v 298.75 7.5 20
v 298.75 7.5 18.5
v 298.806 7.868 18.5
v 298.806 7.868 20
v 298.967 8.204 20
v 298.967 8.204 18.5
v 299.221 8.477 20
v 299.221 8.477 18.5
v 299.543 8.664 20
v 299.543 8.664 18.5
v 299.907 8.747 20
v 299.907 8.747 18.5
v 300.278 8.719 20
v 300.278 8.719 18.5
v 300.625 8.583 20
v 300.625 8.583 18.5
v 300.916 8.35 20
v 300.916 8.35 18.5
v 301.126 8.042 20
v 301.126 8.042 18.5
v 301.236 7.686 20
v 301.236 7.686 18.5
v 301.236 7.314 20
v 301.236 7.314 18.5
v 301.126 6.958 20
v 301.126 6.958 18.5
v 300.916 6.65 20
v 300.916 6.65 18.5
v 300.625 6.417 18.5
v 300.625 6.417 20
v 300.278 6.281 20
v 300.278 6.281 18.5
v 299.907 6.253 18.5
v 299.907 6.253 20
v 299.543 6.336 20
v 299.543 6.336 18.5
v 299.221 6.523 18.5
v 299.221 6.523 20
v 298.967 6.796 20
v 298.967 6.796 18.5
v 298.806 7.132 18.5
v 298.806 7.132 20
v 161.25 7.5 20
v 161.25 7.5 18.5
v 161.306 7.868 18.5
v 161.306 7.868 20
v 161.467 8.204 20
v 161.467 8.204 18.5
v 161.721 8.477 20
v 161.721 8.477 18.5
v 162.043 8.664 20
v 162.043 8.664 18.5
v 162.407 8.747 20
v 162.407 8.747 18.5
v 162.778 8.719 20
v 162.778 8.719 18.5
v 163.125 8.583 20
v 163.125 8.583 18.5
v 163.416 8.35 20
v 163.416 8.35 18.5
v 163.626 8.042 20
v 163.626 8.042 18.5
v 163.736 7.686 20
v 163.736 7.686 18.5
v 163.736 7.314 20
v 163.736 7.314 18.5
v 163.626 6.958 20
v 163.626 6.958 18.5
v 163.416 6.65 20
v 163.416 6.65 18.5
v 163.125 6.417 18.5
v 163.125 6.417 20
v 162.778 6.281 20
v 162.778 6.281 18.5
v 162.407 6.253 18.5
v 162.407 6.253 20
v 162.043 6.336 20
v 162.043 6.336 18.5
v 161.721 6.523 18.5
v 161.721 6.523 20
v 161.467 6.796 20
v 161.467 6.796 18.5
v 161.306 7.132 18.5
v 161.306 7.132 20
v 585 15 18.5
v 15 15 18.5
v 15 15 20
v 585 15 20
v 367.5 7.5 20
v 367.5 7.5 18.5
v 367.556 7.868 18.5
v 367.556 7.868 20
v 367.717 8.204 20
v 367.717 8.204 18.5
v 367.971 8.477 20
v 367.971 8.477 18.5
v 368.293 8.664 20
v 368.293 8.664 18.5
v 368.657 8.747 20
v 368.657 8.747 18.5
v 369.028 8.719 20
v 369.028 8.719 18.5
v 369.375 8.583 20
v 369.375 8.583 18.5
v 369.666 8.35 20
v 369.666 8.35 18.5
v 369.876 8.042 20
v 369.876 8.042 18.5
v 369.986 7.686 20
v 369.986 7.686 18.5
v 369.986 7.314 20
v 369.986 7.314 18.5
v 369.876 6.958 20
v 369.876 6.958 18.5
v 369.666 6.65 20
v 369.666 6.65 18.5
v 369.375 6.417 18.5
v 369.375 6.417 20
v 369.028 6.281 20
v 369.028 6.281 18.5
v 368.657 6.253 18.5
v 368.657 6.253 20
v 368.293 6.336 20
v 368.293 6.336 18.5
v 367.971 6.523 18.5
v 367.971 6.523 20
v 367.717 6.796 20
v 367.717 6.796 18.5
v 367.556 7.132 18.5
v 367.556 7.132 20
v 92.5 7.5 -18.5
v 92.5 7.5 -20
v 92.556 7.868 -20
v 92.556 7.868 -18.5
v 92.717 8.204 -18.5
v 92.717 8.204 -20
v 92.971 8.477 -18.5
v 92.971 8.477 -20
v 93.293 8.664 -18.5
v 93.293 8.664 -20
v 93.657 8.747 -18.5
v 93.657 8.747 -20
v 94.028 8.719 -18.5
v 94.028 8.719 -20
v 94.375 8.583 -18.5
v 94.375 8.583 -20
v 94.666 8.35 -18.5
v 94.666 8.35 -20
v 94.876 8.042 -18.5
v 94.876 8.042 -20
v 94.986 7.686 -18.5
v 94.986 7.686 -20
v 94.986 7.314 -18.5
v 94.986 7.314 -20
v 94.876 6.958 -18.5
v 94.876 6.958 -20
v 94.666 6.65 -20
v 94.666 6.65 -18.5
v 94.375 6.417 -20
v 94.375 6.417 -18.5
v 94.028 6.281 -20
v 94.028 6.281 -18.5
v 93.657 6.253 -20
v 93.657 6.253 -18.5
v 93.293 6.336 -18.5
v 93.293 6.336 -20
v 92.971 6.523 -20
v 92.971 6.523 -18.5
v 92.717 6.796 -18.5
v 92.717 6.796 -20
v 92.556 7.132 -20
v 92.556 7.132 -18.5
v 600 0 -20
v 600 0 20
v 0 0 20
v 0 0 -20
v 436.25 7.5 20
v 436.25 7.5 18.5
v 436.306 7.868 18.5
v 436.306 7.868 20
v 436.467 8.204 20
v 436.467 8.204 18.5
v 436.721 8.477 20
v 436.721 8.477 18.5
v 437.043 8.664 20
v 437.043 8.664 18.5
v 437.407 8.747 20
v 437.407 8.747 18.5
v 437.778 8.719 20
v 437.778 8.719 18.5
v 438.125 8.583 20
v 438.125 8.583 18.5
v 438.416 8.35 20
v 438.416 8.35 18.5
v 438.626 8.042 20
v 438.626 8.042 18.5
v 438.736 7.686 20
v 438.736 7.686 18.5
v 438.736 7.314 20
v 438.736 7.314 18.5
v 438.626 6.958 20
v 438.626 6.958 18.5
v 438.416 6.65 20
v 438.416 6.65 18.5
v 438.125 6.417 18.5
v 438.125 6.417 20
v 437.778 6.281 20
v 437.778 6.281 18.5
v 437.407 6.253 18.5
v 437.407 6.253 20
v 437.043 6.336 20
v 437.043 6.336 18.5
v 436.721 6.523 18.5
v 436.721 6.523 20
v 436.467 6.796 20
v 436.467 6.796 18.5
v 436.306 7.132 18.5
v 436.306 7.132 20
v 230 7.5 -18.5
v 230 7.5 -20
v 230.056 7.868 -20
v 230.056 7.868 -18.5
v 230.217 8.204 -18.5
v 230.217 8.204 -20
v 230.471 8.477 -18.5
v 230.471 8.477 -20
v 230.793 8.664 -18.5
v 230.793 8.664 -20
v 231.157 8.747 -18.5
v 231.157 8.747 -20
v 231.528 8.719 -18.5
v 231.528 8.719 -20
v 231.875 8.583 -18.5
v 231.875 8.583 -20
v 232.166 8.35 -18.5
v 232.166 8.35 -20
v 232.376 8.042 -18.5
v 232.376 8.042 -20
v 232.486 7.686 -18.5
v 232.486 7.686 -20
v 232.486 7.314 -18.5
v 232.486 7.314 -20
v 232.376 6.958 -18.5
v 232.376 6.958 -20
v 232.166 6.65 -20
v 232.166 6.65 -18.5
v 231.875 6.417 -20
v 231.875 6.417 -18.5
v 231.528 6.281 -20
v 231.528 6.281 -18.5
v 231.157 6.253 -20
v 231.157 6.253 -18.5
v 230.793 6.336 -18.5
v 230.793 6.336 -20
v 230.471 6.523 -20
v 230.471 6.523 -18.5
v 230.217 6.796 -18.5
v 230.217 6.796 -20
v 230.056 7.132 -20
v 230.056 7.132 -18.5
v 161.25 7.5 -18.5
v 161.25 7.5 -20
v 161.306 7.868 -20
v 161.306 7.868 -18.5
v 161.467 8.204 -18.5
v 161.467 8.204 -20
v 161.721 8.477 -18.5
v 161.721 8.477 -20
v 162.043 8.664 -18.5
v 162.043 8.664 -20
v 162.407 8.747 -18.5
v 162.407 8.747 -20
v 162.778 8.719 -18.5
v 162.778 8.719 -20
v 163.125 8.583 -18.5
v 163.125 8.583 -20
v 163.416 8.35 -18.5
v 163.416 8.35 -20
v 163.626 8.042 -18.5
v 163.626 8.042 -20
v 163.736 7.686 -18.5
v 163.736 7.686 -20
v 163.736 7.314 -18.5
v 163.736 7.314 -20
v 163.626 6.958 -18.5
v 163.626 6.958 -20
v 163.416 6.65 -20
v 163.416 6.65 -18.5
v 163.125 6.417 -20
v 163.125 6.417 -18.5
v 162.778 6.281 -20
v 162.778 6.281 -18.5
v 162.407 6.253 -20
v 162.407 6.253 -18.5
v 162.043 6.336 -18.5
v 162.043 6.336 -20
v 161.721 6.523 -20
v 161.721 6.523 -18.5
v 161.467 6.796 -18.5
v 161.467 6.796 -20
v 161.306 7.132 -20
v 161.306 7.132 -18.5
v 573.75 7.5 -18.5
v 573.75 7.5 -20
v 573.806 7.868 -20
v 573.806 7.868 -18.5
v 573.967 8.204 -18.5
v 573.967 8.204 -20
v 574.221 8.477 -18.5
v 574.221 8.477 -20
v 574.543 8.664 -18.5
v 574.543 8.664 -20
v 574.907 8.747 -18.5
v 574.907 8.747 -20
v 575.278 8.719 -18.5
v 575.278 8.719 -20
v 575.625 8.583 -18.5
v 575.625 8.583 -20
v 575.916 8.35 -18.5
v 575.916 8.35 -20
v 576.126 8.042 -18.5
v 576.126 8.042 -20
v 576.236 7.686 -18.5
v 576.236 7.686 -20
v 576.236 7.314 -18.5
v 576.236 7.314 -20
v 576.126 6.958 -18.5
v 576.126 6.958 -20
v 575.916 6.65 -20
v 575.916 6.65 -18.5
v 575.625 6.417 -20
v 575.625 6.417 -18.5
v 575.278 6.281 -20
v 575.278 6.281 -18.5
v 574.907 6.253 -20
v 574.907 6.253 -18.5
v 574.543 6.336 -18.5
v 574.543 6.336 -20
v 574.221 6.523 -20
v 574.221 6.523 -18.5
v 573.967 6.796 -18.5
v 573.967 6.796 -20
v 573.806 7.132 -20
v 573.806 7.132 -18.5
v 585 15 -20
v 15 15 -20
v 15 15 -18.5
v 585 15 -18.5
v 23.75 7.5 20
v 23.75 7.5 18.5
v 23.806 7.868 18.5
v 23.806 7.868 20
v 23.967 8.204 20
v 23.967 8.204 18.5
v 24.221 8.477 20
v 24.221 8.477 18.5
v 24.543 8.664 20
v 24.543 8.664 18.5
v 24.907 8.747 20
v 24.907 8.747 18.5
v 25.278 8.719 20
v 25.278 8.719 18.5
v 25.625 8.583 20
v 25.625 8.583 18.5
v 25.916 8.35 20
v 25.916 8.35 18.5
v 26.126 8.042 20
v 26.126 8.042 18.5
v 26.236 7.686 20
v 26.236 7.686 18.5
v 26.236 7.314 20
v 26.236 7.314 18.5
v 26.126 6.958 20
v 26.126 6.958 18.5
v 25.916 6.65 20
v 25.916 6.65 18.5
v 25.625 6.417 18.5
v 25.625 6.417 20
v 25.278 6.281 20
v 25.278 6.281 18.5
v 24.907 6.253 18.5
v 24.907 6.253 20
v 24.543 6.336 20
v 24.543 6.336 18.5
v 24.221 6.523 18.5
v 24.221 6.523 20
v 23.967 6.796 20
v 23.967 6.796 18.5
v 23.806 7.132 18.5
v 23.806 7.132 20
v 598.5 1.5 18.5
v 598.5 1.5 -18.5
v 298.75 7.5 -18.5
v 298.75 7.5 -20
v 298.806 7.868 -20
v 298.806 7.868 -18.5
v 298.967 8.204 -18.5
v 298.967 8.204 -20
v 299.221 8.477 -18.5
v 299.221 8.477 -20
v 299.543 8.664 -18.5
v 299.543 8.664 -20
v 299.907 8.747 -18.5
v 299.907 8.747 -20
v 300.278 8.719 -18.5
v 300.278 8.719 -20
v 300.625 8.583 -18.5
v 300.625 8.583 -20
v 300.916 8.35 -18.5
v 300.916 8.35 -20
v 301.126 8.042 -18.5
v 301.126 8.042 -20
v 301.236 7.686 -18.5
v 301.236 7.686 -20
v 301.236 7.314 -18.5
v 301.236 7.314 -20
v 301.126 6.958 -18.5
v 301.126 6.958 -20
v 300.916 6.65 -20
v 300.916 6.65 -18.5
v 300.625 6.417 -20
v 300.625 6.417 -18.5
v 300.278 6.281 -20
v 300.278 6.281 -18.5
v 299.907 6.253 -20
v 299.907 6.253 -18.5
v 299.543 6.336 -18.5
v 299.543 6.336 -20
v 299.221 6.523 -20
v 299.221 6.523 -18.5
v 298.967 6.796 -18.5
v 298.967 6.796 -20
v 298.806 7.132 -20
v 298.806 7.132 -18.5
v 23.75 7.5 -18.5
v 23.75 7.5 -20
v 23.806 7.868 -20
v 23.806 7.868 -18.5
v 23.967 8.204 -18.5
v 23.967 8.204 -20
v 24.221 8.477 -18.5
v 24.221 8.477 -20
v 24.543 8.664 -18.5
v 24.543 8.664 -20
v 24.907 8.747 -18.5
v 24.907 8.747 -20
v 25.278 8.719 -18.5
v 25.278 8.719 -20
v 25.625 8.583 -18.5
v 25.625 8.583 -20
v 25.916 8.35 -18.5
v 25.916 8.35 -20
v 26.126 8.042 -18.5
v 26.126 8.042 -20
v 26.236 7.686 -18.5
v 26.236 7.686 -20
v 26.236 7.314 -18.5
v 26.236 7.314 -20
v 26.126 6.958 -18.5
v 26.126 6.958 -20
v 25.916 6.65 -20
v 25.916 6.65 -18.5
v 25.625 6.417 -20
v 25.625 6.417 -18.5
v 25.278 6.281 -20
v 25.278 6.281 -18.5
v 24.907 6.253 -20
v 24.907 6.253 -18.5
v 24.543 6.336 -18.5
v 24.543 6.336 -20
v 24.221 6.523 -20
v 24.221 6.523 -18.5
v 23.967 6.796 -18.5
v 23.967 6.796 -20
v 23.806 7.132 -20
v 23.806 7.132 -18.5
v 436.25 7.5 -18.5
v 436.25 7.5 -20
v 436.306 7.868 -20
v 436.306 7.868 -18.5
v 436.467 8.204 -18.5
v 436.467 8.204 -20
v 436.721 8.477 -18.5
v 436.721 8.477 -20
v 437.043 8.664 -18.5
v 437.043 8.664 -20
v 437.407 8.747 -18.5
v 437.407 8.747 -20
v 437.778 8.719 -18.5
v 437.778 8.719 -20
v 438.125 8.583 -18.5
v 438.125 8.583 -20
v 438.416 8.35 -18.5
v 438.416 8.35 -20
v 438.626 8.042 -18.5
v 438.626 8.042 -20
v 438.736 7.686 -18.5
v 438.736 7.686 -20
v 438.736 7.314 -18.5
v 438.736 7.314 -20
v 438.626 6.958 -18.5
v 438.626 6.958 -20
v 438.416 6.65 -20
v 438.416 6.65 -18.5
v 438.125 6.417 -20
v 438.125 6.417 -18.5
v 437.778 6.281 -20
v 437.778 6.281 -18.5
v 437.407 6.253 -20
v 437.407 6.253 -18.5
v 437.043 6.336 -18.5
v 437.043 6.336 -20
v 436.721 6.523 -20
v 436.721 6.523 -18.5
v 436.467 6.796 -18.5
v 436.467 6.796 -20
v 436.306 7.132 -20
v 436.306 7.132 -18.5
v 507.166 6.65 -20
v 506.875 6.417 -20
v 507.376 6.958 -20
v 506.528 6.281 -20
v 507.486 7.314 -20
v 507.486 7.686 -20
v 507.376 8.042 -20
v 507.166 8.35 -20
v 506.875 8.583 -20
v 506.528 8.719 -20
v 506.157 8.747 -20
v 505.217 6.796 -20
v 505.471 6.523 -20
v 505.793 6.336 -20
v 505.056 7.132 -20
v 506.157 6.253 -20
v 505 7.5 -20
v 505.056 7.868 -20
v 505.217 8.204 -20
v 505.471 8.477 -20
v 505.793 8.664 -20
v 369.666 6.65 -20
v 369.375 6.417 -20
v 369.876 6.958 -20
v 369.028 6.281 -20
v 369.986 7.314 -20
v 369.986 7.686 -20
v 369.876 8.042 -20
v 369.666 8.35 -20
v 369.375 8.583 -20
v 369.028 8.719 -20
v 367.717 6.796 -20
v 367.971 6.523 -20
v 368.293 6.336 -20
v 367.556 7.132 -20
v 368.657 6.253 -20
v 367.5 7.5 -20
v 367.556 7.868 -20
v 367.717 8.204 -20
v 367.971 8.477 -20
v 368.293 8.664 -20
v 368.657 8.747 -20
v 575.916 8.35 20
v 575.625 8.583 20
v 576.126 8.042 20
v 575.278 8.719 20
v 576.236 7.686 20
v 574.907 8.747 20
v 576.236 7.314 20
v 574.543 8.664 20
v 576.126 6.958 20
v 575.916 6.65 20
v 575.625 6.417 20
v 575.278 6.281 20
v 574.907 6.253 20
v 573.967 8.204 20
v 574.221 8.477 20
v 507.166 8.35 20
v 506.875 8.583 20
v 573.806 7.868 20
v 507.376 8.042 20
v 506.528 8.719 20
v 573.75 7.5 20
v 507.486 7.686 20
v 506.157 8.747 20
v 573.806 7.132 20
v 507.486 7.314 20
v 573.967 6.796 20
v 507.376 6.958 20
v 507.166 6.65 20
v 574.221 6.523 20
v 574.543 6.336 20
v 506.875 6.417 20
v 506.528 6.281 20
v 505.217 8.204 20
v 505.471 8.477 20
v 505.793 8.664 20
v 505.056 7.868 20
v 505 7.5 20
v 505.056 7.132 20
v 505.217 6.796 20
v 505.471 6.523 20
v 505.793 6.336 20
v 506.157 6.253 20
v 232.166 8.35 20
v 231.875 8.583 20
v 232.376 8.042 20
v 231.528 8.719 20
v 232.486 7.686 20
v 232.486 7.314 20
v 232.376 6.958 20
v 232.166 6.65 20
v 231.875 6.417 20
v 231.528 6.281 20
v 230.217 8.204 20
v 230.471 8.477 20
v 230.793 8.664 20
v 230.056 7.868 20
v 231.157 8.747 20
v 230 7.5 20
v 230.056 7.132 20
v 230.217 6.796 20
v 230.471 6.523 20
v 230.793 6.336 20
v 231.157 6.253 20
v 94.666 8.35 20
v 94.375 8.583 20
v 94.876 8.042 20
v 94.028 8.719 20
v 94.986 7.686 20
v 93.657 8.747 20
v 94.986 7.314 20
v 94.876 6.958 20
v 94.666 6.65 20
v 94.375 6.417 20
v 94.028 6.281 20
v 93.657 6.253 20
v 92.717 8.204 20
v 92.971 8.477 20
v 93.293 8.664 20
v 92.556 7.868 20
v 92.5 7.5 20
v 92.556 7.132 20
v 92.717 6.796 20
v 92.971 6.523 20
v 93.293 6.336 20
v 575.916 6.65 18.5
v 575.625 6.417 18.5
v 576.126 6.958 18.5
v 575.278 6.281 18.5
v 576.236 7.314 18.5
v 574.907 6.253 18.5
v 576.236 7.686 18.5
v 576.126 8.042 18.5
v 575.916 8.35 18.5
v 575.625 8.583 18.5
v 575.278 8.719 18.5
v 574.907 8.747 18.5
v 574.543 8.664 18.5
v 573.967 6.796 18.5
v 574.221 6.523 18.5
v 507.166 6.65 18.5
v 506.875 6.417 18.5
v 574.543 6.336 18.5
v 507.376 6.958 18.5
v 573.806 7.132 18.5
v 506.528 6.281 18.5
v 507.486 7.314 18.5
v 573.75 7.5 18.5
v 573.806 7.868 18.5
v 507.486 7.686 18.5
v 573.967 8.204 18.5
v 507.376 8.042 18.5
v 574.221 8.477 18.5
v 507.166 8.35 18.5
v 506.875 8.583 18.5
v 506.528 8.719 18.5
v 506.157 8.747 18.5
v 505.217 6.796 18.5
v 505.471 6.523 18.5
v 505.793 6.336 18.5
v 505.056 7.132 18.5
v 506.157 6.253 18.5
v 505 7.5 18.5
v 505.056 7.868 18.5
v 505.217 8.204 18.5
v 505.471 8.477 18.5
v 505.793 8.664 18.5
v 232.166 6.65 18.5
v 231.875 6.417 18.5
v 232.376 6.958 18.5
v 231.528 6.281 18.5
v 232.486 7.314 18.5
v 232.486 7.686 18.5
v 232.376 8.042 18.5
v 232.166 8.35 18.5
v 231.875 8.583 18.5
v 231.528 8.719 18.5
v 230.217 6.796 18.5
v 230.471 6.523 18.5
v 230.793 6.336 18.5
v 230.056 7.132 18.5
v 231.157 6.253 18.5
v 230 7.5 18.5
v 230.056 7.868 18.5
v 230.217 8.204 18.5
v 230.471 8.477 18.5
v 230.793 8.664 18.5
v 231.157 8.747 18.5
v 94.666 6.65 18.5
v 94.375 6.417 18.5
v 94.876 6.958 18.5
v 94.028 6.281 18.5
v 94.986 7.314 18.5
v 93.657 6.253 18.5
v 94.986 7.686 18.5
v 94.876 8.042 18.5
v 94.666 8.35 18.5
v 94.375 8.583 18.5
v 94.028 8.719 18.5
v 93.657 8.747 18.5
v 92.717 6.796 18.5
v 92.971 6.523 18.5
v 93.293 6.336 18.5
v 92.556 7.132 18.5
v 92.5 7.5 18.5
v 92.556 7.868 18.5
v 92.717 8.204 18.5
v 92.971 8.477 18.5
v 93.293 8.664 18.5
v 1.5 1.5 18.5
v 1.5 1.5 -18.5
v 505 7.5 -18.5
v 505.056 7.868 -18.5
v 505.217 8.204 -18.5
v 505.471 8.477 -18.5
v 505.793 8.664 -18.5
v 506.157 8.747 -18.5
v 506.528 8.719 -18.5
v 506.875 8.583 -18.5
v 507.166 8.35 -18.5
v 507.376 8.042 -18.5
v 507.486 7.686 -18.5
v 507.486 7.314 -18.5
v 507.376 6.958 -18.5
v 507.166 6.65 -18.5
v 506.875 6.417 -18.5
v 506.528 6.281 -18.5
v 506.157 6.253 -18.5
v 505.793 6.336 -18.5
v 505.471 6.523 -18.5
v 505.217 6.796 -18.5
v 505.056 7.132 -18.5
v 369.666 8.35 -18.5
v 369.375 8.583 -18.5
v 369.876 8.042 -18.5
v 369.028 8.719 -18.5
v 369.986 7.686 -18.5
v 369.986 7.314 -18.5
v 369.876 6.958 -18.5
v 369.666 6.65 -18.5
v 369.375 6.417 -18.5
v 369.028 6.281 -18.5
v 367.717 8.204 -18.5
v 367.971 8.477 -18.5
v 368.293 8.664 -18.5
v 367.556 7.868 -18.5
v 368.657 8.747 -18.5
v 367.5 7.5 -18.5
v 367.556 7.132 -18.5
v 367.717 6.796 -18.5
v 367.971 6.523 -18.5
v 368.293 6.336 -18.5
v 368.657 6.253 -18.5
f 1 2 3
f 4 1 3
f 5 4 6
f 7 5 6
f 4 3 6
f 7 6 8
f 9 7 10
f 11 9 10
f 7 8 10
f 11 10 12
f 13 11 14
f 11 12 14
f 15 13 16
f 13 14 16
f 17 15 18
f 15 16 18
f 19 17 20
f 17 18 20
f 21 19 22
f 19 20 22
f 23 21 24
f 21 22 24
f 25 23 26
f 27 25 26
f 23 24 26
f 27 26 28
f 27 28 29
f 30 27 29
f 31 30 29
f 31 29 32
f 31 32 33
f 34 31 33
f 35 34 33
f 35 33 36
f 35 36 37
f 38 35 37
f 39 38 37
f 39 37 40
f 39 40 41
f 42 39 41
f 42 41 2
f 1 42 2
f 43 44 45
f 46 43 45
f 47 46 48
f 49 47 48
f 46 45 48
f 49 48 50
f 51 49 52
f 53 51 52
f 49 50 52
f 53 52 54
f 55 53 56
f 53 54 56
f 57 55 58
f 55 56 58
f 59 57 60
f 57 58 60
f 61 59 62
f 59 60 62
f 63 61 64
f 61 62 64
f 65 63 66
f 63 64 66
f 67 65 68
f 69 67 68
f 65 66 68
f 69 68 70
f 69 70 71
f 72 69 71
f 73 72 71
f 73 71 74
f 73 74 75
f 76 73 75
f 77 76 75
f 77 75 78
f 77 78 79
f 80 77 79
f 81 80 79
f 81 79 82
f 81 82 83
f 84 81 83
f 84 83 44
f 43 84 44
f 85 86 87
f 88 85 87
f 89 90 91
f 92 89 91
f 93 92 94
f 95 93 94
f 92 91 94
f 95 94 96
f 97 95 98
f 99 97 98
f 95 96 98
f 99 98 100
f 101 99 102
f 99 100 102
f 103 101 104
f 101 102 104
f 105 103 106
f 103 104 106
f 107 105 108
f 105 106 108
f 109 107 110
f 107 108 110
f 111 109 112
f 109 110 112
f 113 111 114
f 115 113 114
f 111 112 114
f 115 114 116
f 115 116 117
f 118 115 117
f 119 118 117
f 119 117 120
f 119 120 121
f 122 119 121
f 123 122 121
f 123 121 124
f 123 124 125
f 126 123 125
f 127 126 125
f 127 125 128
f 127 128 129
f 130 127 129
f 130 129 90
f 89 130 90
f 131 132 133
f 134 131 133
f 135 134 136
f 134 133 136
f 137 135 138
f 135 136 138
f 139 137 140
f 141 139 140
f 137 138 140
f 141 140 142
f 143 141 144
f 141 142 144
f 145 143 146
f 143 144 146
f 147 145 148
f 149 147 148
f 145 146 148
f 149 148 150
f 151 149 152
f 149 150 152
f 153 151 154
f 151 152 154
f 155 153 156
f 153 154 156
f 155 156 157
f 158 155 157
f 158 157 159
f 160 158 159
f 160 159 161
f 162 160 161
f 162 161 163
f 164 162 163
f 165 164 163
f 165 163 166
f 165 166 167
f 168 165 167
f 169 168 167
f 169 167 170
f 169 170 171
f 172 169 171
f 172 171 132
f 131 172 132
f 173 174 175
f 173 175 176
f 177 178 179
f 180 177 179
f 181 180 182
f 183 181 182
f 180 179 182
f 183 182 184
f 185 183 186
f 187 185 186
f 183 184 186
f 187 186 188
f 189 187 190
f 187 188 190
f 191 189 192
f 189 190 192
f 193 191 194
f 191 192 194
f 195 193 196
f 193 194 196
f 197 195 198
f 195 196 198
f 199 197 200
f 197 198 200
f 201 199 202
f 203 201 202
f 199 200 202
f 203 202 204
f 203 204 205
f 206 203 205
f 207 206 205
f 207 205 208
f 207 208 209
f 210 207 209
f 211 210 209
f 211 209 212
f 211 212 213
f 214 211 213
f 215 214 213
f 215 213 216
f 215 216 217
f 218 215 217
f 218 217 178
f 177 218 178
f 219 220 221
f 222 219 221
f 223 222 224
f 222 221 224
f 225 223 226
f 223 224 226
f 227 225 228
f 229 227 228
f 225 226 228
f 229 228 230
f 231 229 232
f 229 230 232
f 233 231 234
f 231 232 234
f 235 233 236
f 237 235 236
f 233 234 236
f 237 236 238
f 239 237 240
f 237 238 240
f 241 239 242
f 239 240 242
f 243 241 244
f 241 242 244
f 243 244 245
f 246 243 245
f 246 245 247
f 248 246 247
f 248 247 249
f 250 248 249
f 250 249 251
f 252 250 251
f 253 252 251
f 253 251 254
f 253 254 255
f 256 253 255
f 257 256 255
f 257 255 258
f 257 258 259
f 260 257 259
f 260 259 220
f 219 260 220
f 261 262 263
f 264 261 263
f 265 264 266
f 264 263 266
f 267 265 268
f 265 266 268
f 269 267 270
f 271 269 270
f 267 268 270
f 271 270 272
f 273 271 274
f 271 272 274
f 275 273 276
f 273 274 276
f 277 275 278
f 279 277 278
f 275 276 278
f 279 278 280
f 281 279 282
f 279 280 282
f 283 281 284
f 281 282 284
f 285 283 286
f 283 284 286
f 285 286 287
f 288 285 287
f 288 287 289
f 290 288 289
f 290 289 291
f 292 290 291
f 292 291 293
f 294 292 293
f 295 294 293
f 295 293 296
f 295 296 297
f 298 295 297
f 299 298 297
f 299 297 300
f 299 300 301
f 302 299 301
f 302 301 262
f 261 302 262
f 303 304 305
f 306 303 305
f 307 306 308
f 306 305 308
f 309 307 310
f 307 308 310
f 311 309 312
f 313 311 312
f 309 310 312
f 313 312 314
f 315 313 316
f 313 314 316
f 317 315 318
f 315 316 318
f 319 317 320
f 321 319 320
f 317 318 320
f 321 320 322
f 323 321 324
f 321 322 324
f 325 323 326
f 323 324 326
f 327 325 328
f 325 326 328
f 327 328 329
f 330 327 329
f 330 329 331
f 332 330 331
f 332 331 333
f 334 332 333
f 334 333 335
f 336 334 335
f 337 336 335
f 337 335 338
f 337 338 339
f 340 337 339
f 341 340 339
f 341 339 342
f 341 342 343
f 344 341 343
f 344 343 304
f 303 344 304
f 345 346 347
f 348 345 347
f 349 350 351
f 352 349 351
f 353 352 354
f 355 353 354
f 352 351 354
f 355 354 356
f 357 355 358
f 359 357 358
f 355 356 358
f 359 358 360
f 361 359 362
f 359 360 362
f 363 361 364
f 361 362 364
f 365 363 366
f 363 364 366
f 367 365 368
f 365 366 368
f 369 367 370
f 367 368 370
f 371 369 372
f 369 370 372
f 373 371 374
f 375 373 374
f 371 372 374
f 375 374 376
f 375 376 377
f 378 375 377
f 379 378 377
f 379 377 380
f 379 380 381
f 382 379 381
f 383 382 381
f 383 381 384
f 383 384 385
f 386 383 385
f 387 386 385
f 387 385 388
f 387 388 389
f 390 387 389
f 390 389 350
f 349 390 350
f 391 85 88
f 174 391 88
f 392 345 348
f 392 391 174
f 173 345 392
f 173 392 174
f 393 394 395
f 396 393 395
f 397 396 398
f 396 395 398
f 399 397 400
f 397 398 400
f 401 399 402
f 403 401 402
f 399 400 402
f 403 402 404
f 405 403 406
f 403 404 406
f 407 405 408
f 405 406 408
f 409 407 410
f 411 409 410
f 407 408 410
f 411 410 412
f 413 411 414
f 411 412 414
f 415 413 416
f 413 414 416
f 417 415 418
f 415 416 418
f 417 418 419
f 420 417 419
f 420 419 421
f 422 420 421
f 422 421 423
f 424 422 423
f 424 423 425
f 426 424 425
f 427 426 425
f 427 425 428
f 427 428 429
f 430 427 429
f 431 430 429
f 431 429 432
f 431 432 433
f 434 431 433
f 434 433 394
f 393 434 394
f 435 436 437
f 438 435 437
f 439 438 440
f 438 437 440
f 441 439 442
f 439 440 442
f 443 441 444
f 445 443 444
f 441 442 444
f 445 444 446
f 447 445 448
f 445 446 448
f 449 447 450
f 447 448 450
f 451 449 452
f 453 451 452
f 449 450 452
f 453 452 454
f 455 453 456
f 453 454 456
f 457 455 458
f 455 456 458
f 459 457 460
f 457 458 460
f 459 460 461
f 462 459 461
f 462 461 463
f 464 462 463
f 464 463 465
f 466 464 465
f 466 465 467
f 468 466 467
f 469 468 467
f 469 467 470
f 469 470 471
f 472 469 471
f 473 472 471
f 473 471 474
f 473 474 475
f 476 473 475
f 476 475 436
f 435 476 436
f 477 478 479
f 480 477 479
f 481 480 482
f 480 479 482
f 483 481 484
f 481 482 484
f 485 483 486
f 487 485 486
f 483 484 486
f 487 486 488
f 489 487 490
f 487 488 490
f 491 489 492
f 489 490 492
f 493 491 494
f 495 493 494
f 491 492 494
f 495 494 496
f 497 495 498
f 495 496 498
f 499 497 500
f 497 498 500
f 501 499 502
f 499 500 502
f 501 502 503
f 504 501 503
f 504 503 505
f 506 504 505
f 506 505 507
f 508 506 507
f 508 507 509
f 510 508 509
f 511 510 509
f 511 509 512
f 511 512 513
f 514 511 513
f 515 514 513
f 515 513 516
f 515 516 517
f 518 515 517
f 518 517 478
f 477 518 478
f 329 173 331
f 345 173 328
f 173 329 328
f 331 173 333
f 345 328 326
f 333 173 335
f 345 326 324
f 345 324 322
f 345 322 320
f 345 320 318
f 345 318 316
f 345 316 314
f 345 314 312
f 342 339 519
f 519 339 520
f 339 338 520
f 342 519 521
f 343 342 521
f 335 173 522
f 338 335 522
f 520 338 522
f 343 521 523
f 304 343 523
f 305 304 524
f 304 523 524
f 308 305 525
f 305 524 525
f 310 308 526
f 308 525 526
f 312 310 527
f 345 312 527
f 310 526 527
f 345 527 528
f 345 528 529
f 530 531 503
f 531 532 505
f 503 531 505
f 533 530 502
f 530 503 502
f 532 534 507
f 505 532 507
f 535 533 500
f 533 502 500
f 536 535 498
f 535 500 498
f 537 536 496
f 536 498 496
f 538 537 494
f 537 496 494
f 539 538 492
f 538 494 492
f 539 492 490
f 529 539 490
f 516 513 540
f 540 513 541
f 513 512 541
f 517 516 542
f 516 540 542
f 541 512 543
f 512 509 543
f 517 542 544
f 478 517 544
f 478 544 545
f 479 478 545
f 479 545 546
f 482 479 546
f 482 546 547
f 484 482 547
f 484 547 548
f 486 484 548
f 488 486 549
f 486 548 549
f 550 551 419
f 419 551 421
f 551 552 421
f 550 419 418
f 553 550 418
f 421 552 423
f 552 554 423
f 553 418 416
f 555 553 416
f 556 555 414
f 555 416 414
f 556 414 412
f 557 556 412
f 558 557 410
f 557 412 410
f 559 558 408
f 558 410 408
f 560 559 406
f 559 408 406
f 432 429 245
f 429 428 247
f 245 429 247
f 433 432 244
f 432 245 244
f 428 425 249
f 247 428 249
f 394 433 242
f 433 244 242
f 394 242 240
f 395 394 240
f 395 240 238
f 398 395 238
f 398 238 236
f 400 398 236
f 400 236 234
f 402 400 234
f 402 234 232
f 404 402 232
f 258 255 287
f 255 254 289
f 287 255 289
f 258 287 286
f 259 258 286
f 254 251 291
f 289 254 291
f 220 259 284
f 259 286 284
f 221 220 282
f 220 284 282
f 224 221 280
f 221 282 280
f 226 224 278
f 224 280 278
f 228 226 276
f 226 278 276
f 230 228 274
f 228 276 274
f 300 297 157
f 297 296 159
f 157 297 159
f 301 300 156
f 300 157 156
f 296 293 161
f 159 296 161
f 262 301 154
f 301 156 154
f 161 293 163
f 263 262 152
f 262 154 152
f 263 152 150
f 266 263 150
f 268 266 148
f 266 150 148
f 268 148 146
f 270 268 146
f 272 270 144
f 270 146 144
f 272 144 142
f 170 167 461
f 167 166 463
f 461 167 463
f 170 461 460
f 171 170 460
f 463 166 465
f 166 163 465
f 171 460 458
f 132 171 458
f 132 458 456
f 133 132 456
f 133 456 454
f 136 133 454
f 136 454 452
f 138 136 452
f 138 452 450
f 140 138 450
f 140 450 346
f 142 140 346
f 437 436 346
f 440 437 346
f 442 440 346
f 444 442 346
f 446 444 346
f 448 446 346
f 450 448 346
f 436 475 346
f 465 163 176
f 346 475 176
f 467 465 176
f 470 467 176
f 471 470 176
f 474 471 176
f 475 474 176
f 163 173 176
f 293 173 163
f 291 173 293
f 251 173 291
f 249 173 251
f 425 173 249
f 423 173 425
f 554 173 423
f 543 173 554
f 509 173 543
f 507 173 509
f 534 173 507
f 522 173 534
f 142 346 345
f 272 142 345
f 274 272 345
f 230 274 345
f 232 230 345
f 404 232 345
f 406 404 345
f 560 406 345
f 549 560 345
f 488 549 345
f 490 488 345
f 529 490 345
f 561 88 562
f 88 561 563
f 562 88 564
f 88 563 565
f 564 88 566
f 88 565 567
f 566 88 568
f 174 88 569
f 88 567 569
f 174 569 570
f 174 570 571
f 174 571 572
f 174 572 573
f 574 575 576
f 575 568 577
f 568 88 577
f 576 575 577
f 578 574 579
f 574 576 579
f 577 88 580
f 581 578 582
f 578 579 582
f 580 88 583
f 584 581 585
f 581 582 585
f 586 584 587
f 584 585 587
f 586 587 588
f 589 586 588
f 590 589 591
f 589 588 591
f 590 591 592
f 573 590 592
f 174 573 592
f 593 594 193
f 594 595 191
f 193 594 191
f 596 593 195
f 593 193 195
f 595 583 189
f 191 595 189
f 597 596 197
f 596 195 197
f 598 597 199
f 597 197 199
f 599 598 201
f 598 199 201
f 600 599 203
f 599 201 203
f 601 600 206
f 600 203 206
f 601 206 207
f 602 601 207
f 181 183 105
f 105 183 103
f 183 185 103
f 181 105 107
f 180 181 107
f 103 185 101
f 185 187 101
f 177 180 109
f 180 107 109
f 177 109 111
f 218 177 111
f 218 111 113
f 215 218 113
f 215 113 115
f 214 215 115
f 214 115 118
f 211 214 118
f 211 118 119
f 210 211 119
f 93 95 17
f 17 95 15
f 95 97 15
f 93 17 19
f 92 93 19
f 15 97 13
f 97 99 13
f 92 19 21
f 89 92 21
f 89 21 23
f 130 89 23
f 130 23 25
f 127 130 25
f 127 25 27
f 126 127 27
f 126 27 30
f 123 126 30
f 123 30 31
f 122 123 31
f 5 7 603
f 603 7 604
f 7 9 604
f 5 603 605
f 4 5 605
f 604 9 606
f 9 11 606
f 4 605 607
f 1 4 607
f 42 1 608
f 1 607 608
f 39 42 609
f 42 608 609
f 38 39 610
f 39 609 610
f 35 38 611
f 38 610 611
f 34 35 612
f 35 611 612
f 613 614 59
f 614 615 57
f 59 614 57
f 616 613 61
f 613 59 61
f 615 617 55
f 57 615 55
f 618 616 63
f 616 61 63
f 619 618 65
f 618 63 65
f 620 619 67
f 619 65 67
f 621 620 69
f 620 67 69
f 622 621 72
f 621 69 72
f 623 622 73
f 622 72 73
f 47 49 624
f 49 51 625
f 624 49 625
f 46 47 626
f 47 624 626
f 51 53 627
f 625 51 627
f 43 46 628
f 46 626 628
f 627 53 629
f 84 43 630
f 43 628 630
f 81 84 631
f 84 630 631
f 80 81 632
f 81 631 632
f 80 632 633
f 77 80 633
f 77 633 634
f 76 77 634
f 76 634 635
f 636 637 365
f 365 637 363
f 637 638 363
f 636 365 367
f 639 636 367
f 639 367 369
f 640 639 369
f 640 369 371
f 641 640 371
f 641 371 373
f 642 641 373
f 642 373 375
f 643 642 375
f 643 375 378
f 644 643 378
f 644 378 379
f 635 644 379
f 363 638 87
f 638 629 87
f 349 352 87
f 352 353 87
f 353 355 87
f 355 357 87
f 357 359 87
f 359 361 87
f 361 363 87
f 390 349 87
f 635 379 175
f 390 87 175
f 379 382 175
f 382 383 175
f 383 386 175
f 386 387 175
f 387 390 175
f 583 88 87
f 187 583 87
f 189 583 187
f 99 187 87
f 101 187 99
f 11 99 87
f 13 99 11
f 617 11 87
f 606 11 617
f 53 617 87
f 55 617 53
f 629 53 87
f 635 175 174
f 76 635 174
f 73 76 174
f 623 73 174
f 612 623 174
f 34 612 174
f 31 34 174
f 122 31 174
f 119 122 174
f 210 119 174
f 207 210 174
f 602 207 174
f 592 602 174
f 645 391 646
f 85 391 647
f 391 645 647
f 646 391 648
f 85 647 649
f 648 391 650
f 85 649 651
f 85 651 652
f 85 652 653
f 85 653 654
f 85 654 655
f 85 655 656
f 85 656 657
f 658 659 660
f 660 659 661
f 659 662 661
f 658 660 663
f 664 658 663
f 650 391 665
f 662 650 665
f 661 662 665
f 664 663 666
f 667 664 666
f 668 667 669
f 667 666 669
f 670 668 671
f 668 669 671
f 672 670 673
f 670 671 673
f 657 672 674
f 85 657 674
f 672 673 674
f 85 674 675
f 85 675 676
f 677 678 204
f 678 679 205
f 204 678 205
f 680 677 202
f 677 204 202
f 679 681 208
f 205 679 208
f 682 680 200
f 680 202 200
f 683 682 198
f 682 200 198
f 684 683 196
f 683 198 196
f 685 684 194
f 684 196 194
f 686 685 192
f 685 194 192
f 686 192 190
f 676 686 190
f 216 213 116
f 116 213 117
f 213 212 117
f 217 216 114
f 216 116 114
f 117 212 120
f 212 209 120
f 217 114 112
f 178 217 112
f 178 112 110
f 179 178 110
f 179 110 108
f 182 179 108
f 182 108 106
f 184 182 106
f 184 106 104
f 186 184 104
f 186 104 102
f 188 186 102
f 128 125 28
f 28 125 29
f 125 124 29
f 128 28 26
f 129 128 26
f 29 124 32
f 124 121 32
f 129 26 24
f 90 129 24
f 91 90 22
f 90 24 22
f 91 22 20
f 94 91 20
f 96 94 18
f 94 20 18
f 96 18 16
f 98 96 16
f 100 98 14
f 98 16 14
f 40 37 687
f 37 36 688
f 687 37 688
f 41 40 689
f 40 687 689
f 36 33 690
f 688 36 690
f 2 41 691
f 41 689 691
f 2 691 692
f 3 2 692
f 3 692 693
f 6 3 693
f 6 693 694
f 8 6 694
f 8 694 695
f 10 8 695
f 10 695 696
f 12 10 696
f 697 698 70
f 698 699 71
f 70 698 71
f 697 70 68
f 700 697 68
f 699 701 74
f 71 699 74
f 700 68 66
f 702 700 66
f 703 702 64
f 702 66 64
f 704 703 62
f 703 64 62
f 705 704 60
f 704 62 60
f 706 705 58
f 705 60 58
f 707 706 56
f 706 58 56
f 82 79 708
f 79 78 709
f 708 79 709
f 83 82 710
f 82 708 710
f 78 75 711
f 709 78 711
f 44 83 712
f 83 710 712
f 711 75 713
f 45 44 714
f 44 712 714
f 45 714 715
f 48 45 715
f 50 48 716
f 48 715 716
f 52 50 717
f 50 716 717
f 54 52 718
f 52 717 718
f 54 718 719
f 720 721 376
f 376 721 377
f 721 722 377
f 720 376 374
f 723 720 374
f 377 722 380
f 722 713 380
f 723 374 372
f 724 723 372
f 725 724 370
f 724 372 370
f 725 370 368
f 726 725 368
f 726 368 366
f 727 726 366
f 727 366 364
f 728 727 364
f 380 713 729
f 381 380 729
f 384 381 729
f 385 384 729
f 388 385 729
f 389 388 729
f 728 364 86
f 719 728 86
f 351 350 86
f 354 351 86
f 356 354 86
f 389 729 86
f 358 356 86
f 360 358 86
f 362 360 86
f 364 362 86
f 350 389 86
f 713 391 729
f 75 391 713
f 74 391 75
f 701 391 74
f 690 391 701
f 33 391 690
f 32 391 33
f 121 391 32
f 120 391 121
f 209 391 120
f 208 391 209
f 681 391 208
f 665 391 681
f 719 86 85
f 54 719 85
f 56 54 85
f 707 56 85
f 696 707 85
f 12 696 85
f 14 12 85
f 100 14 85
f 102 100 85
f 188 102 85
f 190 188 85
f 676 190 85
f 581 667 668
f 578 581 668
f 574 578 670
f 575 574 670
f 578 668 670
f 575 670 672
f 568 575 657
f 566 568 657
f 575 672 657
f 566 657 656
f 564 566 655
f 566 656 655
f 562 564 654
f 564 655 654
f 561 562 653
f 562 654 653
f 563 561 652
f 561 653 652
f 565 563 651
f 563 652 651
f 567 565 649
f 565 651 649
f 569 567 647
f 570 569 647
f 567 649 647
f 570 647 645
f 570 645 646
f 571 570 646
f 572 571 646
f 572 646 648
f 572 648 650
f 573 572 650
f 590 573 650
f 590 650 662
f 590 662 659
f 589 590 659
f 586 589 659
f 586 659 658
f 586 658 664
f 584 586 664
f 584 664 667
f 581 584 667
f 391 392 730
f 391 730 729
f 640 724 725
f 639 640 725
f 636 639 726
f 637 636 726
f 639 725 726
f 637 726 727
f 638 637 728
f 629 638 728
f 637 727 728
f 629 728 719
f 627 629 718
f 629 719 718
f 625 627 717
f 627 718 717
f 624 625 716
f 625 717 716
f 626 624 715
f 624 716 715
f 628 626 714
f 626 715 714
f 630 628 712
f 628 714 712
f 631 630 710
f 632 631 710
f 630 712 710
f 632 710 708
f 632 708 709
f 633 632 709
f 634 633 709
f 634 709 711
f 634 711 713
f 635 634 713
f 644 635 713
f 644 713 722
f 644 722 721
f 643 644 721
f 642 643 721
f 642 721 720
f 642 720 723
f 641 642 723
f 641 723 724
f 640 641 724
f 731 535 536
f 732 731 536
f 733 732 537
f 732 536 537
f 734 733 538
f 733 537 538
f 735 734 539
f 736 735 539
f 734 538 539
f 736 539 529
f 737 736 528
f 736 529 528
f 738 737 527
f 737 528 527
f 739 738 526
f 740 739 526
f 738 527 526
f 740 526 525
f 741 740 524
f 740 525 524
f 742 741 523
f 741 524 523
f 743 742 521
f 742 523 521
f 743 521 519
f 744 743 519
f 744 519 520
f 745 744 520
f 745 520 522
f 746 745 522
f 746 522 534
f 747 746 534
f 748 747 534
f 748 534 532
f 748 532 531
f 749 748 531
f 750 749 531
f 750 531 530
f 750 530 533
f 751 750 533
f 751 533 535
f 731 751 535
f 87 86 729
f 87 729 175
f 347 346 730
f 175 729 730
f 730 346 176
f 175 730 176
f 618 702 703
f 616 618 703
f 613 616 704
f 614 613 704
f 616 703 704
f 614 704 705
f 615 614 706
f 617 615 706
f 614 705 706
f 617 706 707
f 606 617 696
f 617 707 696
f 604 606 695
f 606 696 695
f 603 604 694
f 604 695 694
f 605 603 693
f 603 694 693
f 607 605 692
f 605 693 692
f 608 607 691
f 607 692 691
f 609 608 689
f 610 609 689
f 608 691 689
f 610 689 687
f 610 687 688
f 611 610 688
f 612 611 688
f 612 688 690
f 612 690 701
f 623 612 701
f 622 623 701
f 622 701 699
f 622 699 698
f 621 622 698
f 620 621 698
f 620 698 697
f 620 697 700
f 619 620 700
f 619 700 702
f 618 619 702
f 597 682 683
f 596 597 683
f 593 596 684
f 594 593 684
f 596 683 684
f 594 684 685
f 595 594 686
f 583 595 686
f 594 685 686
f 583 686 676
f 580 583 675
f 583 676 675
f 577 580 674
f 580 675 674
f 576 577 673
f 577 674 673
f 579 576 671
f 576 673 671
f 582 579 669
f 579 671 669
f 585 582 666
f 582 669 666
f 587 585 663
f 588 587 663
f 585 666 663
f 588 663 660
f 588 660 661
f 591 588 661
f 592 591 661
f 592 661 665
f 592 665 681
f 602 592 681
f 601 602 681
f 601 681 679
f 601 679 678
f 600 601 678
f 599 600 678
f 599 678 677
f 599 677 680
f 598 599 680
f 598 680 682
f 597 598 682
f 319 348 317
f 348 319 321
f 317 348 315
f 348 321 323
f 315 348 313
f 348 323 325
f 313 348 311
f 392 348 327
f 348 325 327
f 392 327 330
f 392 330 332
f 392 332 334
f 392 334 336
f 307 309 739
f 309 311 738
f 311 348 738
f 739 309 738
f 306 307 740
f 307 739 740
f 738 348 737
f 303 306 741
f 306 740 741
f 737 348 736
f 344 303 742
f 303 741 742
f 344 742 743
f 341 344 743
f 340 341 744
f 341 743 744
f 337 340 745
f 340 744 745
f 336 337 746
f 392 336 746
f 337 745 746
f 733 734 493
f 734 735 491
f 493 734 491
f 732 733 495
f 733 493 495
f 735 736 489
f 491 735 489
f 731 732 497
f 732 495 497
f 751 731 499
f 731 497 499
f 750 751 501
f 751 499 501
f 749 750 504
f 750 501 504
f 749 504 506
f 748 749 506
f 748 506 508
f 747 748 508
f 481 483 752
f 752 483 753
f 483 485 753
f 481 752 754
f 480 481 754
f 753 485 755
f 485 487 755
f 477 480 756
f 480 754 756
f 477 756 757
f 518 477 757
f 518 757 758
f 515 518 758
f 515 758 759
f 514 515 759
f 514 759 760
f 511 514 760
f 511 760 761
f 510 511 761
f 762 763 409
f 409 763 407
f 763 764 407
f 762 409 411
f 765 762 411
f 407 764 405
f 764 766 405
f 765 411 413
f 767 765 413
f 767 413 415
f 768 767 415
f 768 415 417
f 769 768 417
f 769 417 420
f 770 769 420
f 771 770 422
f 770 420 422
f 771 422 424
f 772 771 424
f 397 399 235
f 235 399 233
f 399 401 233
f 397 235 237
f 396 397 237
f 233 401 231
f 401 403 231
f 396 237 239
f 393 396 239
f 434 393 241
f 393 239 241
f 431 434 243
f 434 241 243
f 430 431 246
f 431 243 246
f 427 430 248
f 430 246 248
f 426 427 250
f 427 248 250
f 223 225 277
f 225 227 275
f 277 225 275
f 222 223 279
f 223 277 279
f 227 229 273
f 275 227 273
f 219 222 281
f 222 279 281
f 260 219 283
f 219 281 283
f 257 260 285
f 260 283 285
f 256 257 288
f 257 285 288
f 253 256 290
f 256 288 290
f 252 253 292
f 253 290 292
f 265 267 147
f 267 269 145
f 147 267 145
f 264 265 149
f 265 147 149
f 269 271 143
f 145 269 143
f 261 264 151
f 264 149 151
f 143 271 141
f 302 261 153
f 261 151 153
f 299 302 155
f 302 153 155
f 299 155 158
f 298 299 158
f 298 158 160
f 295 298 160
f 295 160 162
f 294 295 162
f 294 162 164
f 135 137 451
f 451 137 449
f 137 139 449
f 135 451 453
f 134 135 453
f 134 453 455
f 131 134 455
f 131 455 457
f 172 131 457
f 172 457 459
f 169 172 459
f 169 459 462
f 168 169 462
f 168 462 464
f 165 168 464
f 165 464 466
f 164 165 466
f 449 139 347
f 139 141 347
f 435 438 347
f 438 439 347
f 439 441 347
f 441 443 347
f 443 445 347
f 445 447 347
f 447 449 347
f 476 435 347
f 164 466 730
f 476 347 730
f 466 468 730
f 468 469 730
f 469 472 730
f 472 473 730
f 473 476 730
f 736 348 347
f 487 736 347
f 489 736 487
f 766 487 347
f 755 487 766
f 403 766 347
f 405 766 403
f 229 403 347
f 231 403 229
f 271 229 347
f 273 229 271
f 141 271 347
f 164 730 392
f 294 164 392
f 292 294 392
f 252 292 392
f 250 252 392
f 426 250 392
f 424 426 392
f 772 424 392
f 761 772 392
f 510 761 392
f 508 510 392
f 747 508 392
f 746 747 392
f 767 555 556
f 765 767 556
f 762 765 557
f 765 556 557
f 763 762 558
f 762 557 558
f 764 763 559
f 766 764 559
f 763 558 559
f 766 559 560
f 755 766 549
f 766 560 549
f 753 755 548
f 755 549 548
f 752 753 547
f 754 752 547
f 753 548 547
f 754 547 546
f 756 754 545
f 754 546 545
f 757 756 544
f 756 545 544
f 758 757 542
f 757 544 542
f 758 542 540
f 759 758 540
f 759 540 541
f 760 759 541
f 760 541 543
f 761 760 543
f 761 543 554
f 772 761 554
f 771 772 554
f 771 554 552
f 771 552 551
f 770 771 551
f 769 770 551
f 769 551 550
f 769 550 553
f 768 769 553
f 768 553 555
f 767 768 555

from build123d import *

# Parameters (mm, degrees)
SALIENTE_EXTRUIR1_DEPTH = 600
CROQUIS2_R              = 1.25
CORTAR_EXTRUIR1_DEPTH   = 41


with BuildPart() as part:
    # Croquis1 → Saliente-Extruir1 (new body)
    with BuildSketch(Plane(origin=(0, 0, 0), x_dir=(0, 0, -1), z_dir=(1, 0, 0))):
        Polygon((-20, 0), (20, 0), (20, 15), (18.5, 15), (18.5, 1.5), (-18.5, 1.5), (-18.5, 15), (-20, 15), align=None)
    extrude(amount=SALIENTE_EXTRUIR1_DEPTH)

    # Croquis2 → Cortar-Extruir1 (cut, through all)
    with BuildSketch(Plane(origin=(0, 0, -20), x_dir=(-1, 0, 0), z_dir=(0, 0, -1))):
        with Locations((-25, 7.5)):
            Circle(CROQUIS2_R)
        with Locations((-93.75, 7.5)):
            Circle(CROQUIS2_R)
        with Locations((-162.5, 7.5)):
            Circle(CROQUIS2_R)
        with Locations((-231.25, 7.5)):
            Circle(CROQUIS2_R)
        with Locations((-368.75, 7.5)):
            Circle(CROQUIS2_R)
        with Locations((-437.5, 7.5)):
            Circle(CROQUIS2_R)
        with Locations((-506.25, 7.5)):
            Circle(CROQUIS2_R)
        with Locations((-575, 7.5)):
            Circle(CROQUIS2_R)
        with Locations((-300, 7.5)):
            Circle(CROQUIS2_R)
        Polygon((-600, 15), (-585, 15), (-600, 0), align=None)
        Polygon((0, 15), (-15, 15), (0, 0), align=None)
    extrude(amount=-CORTAR_EXTRUIR1_DEPTH, mode=Mode.SUBTRACT)


solid = part.part
